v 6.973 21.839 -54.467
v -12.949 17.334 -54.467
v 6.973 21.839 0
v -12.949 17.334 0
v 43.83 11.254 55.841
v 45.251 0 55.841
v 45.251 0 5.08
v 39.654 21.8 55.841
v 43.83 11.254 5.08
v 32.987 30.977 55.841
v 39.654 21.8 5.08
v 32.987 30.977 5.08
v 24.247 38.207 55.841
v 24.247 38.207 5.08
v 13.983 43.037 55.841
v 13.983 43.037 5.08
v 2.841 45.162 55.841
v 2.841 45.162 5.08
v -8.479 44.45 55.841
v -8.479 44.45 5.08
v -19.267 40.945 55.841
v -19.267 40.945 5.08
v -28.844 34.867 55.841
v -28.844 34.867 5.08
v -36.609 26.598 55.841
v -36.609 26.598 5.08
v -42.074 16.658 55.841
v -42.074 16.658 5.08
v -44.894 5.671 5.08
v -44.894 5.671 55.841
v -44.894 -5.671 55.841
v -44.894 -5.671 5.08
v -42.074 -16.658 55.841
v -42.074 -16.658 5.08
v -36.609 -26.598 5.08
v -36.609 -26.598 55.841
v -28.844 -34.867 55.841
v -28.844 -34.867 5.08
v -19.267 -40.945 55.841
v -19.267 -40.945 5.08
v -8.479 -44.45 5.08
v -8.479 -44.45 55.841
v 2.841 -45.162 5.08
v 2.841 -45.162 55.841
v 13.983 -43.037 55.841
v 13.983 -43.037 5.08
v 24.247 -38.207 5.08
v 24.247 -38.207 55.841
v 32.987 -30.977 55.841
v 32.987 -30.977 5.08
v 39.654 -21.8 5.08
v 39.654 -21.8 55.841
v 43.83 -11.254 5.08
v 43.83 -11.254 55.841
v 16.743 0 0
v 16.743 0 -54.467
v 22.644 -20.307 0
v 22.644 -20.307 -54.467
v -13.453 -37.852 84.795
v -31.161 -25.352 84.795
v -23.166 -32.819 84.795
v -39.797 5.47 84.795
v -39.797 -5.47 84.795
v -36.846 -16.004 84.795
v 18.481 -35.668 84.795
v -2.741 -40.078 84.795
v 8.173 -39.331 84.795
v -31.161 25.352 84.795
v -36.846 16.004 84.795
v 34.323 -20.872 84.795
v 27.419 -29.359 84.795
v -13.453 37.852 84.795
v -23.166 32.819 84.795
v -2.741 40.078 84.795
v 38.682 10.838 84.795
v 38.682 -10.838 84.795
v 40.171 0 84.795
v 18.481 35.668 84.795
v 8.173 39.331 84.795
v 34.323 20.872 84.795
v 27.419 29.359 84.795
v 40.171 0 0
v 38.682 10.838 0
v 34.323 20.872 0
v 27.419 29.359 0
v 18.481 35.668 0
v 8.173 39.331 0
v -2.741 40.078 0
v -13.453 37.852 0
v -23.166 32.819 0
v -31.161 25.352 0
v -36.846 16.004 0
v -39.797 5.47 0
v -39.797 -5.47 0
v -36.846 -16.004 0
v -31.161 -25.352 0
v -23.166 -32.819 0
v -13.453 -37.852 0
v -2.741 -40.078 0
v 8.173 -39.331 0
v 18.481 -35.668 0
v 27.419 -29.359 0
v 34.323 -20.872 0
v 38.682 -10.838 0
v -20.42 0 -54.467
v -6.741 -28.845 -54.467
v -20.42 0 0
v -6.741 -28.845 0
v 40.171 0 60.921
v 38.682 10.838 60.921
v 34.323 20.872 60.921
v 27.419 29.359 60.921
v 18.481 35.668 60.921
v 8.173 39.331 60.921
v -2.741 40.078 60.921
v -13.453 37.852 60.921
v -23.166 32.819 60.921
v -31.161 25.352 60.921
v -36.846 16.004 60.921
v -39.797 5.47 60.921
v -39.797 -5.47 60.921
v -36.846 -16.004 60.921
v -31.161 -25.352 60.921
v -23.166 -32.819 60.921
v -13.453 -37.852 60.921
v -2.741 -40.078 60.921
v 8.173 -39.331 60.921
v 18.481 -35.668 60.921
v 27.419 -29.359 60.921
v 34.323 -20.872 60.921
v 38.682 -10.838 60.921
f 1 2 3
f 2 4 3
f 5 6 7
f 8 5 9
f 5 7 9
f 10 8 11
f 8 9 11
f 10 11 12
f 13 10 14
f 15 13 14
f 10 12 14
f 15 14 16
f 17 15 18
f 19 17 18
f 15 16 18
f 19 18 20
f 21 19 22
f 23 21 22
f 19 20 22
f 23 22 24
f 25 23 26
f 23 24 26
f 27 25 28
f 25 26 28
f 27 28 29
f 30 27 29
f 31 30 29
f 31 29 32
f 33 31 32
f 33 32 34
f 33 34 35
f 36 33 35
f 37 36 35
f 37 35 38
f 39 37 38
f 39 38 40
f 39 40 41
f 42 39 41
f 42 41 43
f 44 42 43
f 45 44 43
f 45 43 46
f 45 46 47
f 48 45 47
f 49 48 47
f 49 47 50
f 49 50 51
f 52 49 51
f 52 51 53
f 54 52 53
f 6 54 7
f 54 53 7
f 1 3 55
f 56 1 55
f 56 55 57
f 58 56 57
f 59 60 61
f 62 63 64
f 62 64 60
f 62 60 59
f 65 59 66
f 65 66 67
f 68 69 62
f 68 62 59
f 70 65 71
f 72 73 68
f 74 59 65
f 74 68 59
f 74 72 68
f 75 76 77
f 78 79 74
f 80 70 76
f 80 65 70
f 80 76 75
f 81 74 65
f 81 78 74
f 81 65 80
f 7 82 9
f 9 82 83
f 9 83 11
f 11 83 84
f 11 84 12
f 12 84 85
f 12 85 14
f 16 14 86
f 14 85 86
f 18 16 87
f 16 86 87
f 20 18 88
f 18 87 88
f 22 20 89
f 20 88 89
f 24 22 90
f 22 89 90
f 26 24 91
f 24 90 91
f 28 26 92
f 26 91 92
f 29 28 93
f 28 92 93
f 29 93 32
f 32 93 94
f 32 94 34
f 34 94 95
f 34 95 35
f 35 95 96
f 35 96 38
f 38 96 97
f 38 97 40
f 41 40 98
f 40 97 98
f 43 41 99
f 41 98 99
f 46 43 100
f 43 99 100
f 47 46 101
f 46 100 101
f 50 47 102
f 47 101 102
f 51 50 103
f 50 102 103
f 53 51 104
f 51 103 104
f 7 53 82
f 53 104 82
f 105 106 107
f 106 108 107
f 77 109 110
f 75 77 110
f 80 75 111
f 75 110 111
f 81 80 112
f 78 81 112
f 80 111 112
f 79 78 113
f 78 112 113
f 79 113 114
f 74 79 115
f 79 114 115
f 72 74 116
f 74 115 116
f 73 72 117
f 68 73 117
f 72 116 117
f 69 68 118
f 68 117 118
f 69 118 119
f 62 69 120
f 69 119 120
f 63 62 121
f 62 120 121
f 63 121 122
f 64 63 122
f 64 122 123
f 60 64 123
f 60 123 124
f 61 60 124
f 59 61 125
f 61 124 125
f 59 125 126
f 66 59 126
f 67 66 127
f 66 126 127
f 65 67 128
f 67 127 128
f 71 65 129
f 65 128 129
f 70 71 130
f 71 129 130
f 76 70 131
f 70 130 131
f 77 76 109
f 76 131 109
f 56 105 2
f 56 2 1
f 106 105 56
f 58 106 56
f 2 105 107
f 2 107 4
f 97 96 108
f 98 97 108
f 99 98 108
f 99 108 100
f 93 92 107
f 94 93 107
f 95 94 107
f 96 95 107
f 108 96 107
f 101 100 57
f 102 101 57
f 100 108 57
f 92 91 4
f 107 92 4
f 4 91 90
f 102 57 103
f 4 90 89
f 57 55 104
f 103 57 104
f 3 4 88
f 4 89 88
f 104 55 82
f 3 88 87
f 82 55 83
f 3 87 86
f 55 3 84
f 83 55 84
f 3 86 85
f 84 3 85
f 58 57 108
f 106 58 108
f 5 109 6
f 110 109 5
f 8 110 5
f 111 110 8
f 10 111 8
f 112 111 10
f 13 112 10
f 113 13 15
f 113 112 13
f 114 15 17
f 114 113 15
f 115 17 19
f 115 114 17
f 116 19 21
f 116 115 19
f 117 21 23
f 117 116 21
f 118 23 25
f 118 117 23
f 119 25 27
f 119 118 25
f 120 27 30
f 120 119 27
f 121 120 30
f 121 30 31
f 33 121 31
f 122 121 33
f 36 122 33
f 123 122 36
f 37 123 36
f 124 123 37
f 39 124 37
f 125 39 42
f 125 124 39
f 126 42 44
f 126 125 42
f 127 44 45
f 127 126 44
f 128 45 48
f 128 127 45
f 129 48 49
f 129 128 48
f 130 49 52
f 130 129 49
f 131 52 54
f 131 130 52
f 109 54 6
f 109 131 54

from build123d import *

# Parameters (mm, degrees)
F0_R     = 45.2513140414
F1_DEPTH = 36.2754836679
F3_DEPTH = 38.2841601968
F5_DEPTH = 24.6460158378
F6_SIZE  = 5.08
F7_DEPTH = 23.8733459264
F8_DEPTH = 16.1826983094


with BuildPart() as f1:
    # F0 (on Top) → F1 (new body)
    with BuildSketch(Plane.XY):
        Circle(F0_R)
    extrude(amount=F1_DEPTH)

    # F2 (on face) → F3 (join)
    with BuildSketch(Plane(origin=(0, 0, 0), x_dir=(1, 0, 0), z_dir=(0, 0, -1))):
        Polygon((-12.9493158311, -17.3341035843), (6.9733597338, -21.838657558), (16.743408516, 0), (22.6436909288, 20.306520164), (-6.7410551447, 28.8445807998), (-20.420435816, 0), align=None)
    extrude(amount=F3_DEPTH)

    # F5 (add): a face of the model
    f5_faces = [f1.faces().sort_by_distance(p)[0] for p in [
        (0, 0, 36.2754836679),
    ]]
    extrude(f5_faces, amount=F5_DEPTH)

    # F6
    f6_edges = [f1.edges().sort_by_distance(p)[0] for p in [
        (-45.251314, 0, 60.9215),
        (-45.251314, 0, 0),
        (45.251314, 0, 30.46075),
    ]]
    chamfer(f6_edges, length=F6_SIZE)

    # F7 (add): a face of the model
    f7_faces = [f1.faces().sort_by_distance(p)[0] for p in [
        (0, 0, 60.9214995056),
    ]]
    extrude(f7_faces, amount=F7_DEPTH)

    # F4 (on face) → F8 (join)
    with BuildSketch(Plane(origin=(0, 0, -38.2841601968), x_dir=(1, 0, 0), z_dir=(0, 0, -1))):
        Polygon((22.6436909288, 20.306520164), (-6.7410551447, 28.8445807998), (-20.420435816, 0), (-12.9493158311, -17.3341035843), (6.9733597338, -21.838657558), (16.743408516, 0), align=None)
    extrude(amount=F8_DEPTH)


solid = f1.part
